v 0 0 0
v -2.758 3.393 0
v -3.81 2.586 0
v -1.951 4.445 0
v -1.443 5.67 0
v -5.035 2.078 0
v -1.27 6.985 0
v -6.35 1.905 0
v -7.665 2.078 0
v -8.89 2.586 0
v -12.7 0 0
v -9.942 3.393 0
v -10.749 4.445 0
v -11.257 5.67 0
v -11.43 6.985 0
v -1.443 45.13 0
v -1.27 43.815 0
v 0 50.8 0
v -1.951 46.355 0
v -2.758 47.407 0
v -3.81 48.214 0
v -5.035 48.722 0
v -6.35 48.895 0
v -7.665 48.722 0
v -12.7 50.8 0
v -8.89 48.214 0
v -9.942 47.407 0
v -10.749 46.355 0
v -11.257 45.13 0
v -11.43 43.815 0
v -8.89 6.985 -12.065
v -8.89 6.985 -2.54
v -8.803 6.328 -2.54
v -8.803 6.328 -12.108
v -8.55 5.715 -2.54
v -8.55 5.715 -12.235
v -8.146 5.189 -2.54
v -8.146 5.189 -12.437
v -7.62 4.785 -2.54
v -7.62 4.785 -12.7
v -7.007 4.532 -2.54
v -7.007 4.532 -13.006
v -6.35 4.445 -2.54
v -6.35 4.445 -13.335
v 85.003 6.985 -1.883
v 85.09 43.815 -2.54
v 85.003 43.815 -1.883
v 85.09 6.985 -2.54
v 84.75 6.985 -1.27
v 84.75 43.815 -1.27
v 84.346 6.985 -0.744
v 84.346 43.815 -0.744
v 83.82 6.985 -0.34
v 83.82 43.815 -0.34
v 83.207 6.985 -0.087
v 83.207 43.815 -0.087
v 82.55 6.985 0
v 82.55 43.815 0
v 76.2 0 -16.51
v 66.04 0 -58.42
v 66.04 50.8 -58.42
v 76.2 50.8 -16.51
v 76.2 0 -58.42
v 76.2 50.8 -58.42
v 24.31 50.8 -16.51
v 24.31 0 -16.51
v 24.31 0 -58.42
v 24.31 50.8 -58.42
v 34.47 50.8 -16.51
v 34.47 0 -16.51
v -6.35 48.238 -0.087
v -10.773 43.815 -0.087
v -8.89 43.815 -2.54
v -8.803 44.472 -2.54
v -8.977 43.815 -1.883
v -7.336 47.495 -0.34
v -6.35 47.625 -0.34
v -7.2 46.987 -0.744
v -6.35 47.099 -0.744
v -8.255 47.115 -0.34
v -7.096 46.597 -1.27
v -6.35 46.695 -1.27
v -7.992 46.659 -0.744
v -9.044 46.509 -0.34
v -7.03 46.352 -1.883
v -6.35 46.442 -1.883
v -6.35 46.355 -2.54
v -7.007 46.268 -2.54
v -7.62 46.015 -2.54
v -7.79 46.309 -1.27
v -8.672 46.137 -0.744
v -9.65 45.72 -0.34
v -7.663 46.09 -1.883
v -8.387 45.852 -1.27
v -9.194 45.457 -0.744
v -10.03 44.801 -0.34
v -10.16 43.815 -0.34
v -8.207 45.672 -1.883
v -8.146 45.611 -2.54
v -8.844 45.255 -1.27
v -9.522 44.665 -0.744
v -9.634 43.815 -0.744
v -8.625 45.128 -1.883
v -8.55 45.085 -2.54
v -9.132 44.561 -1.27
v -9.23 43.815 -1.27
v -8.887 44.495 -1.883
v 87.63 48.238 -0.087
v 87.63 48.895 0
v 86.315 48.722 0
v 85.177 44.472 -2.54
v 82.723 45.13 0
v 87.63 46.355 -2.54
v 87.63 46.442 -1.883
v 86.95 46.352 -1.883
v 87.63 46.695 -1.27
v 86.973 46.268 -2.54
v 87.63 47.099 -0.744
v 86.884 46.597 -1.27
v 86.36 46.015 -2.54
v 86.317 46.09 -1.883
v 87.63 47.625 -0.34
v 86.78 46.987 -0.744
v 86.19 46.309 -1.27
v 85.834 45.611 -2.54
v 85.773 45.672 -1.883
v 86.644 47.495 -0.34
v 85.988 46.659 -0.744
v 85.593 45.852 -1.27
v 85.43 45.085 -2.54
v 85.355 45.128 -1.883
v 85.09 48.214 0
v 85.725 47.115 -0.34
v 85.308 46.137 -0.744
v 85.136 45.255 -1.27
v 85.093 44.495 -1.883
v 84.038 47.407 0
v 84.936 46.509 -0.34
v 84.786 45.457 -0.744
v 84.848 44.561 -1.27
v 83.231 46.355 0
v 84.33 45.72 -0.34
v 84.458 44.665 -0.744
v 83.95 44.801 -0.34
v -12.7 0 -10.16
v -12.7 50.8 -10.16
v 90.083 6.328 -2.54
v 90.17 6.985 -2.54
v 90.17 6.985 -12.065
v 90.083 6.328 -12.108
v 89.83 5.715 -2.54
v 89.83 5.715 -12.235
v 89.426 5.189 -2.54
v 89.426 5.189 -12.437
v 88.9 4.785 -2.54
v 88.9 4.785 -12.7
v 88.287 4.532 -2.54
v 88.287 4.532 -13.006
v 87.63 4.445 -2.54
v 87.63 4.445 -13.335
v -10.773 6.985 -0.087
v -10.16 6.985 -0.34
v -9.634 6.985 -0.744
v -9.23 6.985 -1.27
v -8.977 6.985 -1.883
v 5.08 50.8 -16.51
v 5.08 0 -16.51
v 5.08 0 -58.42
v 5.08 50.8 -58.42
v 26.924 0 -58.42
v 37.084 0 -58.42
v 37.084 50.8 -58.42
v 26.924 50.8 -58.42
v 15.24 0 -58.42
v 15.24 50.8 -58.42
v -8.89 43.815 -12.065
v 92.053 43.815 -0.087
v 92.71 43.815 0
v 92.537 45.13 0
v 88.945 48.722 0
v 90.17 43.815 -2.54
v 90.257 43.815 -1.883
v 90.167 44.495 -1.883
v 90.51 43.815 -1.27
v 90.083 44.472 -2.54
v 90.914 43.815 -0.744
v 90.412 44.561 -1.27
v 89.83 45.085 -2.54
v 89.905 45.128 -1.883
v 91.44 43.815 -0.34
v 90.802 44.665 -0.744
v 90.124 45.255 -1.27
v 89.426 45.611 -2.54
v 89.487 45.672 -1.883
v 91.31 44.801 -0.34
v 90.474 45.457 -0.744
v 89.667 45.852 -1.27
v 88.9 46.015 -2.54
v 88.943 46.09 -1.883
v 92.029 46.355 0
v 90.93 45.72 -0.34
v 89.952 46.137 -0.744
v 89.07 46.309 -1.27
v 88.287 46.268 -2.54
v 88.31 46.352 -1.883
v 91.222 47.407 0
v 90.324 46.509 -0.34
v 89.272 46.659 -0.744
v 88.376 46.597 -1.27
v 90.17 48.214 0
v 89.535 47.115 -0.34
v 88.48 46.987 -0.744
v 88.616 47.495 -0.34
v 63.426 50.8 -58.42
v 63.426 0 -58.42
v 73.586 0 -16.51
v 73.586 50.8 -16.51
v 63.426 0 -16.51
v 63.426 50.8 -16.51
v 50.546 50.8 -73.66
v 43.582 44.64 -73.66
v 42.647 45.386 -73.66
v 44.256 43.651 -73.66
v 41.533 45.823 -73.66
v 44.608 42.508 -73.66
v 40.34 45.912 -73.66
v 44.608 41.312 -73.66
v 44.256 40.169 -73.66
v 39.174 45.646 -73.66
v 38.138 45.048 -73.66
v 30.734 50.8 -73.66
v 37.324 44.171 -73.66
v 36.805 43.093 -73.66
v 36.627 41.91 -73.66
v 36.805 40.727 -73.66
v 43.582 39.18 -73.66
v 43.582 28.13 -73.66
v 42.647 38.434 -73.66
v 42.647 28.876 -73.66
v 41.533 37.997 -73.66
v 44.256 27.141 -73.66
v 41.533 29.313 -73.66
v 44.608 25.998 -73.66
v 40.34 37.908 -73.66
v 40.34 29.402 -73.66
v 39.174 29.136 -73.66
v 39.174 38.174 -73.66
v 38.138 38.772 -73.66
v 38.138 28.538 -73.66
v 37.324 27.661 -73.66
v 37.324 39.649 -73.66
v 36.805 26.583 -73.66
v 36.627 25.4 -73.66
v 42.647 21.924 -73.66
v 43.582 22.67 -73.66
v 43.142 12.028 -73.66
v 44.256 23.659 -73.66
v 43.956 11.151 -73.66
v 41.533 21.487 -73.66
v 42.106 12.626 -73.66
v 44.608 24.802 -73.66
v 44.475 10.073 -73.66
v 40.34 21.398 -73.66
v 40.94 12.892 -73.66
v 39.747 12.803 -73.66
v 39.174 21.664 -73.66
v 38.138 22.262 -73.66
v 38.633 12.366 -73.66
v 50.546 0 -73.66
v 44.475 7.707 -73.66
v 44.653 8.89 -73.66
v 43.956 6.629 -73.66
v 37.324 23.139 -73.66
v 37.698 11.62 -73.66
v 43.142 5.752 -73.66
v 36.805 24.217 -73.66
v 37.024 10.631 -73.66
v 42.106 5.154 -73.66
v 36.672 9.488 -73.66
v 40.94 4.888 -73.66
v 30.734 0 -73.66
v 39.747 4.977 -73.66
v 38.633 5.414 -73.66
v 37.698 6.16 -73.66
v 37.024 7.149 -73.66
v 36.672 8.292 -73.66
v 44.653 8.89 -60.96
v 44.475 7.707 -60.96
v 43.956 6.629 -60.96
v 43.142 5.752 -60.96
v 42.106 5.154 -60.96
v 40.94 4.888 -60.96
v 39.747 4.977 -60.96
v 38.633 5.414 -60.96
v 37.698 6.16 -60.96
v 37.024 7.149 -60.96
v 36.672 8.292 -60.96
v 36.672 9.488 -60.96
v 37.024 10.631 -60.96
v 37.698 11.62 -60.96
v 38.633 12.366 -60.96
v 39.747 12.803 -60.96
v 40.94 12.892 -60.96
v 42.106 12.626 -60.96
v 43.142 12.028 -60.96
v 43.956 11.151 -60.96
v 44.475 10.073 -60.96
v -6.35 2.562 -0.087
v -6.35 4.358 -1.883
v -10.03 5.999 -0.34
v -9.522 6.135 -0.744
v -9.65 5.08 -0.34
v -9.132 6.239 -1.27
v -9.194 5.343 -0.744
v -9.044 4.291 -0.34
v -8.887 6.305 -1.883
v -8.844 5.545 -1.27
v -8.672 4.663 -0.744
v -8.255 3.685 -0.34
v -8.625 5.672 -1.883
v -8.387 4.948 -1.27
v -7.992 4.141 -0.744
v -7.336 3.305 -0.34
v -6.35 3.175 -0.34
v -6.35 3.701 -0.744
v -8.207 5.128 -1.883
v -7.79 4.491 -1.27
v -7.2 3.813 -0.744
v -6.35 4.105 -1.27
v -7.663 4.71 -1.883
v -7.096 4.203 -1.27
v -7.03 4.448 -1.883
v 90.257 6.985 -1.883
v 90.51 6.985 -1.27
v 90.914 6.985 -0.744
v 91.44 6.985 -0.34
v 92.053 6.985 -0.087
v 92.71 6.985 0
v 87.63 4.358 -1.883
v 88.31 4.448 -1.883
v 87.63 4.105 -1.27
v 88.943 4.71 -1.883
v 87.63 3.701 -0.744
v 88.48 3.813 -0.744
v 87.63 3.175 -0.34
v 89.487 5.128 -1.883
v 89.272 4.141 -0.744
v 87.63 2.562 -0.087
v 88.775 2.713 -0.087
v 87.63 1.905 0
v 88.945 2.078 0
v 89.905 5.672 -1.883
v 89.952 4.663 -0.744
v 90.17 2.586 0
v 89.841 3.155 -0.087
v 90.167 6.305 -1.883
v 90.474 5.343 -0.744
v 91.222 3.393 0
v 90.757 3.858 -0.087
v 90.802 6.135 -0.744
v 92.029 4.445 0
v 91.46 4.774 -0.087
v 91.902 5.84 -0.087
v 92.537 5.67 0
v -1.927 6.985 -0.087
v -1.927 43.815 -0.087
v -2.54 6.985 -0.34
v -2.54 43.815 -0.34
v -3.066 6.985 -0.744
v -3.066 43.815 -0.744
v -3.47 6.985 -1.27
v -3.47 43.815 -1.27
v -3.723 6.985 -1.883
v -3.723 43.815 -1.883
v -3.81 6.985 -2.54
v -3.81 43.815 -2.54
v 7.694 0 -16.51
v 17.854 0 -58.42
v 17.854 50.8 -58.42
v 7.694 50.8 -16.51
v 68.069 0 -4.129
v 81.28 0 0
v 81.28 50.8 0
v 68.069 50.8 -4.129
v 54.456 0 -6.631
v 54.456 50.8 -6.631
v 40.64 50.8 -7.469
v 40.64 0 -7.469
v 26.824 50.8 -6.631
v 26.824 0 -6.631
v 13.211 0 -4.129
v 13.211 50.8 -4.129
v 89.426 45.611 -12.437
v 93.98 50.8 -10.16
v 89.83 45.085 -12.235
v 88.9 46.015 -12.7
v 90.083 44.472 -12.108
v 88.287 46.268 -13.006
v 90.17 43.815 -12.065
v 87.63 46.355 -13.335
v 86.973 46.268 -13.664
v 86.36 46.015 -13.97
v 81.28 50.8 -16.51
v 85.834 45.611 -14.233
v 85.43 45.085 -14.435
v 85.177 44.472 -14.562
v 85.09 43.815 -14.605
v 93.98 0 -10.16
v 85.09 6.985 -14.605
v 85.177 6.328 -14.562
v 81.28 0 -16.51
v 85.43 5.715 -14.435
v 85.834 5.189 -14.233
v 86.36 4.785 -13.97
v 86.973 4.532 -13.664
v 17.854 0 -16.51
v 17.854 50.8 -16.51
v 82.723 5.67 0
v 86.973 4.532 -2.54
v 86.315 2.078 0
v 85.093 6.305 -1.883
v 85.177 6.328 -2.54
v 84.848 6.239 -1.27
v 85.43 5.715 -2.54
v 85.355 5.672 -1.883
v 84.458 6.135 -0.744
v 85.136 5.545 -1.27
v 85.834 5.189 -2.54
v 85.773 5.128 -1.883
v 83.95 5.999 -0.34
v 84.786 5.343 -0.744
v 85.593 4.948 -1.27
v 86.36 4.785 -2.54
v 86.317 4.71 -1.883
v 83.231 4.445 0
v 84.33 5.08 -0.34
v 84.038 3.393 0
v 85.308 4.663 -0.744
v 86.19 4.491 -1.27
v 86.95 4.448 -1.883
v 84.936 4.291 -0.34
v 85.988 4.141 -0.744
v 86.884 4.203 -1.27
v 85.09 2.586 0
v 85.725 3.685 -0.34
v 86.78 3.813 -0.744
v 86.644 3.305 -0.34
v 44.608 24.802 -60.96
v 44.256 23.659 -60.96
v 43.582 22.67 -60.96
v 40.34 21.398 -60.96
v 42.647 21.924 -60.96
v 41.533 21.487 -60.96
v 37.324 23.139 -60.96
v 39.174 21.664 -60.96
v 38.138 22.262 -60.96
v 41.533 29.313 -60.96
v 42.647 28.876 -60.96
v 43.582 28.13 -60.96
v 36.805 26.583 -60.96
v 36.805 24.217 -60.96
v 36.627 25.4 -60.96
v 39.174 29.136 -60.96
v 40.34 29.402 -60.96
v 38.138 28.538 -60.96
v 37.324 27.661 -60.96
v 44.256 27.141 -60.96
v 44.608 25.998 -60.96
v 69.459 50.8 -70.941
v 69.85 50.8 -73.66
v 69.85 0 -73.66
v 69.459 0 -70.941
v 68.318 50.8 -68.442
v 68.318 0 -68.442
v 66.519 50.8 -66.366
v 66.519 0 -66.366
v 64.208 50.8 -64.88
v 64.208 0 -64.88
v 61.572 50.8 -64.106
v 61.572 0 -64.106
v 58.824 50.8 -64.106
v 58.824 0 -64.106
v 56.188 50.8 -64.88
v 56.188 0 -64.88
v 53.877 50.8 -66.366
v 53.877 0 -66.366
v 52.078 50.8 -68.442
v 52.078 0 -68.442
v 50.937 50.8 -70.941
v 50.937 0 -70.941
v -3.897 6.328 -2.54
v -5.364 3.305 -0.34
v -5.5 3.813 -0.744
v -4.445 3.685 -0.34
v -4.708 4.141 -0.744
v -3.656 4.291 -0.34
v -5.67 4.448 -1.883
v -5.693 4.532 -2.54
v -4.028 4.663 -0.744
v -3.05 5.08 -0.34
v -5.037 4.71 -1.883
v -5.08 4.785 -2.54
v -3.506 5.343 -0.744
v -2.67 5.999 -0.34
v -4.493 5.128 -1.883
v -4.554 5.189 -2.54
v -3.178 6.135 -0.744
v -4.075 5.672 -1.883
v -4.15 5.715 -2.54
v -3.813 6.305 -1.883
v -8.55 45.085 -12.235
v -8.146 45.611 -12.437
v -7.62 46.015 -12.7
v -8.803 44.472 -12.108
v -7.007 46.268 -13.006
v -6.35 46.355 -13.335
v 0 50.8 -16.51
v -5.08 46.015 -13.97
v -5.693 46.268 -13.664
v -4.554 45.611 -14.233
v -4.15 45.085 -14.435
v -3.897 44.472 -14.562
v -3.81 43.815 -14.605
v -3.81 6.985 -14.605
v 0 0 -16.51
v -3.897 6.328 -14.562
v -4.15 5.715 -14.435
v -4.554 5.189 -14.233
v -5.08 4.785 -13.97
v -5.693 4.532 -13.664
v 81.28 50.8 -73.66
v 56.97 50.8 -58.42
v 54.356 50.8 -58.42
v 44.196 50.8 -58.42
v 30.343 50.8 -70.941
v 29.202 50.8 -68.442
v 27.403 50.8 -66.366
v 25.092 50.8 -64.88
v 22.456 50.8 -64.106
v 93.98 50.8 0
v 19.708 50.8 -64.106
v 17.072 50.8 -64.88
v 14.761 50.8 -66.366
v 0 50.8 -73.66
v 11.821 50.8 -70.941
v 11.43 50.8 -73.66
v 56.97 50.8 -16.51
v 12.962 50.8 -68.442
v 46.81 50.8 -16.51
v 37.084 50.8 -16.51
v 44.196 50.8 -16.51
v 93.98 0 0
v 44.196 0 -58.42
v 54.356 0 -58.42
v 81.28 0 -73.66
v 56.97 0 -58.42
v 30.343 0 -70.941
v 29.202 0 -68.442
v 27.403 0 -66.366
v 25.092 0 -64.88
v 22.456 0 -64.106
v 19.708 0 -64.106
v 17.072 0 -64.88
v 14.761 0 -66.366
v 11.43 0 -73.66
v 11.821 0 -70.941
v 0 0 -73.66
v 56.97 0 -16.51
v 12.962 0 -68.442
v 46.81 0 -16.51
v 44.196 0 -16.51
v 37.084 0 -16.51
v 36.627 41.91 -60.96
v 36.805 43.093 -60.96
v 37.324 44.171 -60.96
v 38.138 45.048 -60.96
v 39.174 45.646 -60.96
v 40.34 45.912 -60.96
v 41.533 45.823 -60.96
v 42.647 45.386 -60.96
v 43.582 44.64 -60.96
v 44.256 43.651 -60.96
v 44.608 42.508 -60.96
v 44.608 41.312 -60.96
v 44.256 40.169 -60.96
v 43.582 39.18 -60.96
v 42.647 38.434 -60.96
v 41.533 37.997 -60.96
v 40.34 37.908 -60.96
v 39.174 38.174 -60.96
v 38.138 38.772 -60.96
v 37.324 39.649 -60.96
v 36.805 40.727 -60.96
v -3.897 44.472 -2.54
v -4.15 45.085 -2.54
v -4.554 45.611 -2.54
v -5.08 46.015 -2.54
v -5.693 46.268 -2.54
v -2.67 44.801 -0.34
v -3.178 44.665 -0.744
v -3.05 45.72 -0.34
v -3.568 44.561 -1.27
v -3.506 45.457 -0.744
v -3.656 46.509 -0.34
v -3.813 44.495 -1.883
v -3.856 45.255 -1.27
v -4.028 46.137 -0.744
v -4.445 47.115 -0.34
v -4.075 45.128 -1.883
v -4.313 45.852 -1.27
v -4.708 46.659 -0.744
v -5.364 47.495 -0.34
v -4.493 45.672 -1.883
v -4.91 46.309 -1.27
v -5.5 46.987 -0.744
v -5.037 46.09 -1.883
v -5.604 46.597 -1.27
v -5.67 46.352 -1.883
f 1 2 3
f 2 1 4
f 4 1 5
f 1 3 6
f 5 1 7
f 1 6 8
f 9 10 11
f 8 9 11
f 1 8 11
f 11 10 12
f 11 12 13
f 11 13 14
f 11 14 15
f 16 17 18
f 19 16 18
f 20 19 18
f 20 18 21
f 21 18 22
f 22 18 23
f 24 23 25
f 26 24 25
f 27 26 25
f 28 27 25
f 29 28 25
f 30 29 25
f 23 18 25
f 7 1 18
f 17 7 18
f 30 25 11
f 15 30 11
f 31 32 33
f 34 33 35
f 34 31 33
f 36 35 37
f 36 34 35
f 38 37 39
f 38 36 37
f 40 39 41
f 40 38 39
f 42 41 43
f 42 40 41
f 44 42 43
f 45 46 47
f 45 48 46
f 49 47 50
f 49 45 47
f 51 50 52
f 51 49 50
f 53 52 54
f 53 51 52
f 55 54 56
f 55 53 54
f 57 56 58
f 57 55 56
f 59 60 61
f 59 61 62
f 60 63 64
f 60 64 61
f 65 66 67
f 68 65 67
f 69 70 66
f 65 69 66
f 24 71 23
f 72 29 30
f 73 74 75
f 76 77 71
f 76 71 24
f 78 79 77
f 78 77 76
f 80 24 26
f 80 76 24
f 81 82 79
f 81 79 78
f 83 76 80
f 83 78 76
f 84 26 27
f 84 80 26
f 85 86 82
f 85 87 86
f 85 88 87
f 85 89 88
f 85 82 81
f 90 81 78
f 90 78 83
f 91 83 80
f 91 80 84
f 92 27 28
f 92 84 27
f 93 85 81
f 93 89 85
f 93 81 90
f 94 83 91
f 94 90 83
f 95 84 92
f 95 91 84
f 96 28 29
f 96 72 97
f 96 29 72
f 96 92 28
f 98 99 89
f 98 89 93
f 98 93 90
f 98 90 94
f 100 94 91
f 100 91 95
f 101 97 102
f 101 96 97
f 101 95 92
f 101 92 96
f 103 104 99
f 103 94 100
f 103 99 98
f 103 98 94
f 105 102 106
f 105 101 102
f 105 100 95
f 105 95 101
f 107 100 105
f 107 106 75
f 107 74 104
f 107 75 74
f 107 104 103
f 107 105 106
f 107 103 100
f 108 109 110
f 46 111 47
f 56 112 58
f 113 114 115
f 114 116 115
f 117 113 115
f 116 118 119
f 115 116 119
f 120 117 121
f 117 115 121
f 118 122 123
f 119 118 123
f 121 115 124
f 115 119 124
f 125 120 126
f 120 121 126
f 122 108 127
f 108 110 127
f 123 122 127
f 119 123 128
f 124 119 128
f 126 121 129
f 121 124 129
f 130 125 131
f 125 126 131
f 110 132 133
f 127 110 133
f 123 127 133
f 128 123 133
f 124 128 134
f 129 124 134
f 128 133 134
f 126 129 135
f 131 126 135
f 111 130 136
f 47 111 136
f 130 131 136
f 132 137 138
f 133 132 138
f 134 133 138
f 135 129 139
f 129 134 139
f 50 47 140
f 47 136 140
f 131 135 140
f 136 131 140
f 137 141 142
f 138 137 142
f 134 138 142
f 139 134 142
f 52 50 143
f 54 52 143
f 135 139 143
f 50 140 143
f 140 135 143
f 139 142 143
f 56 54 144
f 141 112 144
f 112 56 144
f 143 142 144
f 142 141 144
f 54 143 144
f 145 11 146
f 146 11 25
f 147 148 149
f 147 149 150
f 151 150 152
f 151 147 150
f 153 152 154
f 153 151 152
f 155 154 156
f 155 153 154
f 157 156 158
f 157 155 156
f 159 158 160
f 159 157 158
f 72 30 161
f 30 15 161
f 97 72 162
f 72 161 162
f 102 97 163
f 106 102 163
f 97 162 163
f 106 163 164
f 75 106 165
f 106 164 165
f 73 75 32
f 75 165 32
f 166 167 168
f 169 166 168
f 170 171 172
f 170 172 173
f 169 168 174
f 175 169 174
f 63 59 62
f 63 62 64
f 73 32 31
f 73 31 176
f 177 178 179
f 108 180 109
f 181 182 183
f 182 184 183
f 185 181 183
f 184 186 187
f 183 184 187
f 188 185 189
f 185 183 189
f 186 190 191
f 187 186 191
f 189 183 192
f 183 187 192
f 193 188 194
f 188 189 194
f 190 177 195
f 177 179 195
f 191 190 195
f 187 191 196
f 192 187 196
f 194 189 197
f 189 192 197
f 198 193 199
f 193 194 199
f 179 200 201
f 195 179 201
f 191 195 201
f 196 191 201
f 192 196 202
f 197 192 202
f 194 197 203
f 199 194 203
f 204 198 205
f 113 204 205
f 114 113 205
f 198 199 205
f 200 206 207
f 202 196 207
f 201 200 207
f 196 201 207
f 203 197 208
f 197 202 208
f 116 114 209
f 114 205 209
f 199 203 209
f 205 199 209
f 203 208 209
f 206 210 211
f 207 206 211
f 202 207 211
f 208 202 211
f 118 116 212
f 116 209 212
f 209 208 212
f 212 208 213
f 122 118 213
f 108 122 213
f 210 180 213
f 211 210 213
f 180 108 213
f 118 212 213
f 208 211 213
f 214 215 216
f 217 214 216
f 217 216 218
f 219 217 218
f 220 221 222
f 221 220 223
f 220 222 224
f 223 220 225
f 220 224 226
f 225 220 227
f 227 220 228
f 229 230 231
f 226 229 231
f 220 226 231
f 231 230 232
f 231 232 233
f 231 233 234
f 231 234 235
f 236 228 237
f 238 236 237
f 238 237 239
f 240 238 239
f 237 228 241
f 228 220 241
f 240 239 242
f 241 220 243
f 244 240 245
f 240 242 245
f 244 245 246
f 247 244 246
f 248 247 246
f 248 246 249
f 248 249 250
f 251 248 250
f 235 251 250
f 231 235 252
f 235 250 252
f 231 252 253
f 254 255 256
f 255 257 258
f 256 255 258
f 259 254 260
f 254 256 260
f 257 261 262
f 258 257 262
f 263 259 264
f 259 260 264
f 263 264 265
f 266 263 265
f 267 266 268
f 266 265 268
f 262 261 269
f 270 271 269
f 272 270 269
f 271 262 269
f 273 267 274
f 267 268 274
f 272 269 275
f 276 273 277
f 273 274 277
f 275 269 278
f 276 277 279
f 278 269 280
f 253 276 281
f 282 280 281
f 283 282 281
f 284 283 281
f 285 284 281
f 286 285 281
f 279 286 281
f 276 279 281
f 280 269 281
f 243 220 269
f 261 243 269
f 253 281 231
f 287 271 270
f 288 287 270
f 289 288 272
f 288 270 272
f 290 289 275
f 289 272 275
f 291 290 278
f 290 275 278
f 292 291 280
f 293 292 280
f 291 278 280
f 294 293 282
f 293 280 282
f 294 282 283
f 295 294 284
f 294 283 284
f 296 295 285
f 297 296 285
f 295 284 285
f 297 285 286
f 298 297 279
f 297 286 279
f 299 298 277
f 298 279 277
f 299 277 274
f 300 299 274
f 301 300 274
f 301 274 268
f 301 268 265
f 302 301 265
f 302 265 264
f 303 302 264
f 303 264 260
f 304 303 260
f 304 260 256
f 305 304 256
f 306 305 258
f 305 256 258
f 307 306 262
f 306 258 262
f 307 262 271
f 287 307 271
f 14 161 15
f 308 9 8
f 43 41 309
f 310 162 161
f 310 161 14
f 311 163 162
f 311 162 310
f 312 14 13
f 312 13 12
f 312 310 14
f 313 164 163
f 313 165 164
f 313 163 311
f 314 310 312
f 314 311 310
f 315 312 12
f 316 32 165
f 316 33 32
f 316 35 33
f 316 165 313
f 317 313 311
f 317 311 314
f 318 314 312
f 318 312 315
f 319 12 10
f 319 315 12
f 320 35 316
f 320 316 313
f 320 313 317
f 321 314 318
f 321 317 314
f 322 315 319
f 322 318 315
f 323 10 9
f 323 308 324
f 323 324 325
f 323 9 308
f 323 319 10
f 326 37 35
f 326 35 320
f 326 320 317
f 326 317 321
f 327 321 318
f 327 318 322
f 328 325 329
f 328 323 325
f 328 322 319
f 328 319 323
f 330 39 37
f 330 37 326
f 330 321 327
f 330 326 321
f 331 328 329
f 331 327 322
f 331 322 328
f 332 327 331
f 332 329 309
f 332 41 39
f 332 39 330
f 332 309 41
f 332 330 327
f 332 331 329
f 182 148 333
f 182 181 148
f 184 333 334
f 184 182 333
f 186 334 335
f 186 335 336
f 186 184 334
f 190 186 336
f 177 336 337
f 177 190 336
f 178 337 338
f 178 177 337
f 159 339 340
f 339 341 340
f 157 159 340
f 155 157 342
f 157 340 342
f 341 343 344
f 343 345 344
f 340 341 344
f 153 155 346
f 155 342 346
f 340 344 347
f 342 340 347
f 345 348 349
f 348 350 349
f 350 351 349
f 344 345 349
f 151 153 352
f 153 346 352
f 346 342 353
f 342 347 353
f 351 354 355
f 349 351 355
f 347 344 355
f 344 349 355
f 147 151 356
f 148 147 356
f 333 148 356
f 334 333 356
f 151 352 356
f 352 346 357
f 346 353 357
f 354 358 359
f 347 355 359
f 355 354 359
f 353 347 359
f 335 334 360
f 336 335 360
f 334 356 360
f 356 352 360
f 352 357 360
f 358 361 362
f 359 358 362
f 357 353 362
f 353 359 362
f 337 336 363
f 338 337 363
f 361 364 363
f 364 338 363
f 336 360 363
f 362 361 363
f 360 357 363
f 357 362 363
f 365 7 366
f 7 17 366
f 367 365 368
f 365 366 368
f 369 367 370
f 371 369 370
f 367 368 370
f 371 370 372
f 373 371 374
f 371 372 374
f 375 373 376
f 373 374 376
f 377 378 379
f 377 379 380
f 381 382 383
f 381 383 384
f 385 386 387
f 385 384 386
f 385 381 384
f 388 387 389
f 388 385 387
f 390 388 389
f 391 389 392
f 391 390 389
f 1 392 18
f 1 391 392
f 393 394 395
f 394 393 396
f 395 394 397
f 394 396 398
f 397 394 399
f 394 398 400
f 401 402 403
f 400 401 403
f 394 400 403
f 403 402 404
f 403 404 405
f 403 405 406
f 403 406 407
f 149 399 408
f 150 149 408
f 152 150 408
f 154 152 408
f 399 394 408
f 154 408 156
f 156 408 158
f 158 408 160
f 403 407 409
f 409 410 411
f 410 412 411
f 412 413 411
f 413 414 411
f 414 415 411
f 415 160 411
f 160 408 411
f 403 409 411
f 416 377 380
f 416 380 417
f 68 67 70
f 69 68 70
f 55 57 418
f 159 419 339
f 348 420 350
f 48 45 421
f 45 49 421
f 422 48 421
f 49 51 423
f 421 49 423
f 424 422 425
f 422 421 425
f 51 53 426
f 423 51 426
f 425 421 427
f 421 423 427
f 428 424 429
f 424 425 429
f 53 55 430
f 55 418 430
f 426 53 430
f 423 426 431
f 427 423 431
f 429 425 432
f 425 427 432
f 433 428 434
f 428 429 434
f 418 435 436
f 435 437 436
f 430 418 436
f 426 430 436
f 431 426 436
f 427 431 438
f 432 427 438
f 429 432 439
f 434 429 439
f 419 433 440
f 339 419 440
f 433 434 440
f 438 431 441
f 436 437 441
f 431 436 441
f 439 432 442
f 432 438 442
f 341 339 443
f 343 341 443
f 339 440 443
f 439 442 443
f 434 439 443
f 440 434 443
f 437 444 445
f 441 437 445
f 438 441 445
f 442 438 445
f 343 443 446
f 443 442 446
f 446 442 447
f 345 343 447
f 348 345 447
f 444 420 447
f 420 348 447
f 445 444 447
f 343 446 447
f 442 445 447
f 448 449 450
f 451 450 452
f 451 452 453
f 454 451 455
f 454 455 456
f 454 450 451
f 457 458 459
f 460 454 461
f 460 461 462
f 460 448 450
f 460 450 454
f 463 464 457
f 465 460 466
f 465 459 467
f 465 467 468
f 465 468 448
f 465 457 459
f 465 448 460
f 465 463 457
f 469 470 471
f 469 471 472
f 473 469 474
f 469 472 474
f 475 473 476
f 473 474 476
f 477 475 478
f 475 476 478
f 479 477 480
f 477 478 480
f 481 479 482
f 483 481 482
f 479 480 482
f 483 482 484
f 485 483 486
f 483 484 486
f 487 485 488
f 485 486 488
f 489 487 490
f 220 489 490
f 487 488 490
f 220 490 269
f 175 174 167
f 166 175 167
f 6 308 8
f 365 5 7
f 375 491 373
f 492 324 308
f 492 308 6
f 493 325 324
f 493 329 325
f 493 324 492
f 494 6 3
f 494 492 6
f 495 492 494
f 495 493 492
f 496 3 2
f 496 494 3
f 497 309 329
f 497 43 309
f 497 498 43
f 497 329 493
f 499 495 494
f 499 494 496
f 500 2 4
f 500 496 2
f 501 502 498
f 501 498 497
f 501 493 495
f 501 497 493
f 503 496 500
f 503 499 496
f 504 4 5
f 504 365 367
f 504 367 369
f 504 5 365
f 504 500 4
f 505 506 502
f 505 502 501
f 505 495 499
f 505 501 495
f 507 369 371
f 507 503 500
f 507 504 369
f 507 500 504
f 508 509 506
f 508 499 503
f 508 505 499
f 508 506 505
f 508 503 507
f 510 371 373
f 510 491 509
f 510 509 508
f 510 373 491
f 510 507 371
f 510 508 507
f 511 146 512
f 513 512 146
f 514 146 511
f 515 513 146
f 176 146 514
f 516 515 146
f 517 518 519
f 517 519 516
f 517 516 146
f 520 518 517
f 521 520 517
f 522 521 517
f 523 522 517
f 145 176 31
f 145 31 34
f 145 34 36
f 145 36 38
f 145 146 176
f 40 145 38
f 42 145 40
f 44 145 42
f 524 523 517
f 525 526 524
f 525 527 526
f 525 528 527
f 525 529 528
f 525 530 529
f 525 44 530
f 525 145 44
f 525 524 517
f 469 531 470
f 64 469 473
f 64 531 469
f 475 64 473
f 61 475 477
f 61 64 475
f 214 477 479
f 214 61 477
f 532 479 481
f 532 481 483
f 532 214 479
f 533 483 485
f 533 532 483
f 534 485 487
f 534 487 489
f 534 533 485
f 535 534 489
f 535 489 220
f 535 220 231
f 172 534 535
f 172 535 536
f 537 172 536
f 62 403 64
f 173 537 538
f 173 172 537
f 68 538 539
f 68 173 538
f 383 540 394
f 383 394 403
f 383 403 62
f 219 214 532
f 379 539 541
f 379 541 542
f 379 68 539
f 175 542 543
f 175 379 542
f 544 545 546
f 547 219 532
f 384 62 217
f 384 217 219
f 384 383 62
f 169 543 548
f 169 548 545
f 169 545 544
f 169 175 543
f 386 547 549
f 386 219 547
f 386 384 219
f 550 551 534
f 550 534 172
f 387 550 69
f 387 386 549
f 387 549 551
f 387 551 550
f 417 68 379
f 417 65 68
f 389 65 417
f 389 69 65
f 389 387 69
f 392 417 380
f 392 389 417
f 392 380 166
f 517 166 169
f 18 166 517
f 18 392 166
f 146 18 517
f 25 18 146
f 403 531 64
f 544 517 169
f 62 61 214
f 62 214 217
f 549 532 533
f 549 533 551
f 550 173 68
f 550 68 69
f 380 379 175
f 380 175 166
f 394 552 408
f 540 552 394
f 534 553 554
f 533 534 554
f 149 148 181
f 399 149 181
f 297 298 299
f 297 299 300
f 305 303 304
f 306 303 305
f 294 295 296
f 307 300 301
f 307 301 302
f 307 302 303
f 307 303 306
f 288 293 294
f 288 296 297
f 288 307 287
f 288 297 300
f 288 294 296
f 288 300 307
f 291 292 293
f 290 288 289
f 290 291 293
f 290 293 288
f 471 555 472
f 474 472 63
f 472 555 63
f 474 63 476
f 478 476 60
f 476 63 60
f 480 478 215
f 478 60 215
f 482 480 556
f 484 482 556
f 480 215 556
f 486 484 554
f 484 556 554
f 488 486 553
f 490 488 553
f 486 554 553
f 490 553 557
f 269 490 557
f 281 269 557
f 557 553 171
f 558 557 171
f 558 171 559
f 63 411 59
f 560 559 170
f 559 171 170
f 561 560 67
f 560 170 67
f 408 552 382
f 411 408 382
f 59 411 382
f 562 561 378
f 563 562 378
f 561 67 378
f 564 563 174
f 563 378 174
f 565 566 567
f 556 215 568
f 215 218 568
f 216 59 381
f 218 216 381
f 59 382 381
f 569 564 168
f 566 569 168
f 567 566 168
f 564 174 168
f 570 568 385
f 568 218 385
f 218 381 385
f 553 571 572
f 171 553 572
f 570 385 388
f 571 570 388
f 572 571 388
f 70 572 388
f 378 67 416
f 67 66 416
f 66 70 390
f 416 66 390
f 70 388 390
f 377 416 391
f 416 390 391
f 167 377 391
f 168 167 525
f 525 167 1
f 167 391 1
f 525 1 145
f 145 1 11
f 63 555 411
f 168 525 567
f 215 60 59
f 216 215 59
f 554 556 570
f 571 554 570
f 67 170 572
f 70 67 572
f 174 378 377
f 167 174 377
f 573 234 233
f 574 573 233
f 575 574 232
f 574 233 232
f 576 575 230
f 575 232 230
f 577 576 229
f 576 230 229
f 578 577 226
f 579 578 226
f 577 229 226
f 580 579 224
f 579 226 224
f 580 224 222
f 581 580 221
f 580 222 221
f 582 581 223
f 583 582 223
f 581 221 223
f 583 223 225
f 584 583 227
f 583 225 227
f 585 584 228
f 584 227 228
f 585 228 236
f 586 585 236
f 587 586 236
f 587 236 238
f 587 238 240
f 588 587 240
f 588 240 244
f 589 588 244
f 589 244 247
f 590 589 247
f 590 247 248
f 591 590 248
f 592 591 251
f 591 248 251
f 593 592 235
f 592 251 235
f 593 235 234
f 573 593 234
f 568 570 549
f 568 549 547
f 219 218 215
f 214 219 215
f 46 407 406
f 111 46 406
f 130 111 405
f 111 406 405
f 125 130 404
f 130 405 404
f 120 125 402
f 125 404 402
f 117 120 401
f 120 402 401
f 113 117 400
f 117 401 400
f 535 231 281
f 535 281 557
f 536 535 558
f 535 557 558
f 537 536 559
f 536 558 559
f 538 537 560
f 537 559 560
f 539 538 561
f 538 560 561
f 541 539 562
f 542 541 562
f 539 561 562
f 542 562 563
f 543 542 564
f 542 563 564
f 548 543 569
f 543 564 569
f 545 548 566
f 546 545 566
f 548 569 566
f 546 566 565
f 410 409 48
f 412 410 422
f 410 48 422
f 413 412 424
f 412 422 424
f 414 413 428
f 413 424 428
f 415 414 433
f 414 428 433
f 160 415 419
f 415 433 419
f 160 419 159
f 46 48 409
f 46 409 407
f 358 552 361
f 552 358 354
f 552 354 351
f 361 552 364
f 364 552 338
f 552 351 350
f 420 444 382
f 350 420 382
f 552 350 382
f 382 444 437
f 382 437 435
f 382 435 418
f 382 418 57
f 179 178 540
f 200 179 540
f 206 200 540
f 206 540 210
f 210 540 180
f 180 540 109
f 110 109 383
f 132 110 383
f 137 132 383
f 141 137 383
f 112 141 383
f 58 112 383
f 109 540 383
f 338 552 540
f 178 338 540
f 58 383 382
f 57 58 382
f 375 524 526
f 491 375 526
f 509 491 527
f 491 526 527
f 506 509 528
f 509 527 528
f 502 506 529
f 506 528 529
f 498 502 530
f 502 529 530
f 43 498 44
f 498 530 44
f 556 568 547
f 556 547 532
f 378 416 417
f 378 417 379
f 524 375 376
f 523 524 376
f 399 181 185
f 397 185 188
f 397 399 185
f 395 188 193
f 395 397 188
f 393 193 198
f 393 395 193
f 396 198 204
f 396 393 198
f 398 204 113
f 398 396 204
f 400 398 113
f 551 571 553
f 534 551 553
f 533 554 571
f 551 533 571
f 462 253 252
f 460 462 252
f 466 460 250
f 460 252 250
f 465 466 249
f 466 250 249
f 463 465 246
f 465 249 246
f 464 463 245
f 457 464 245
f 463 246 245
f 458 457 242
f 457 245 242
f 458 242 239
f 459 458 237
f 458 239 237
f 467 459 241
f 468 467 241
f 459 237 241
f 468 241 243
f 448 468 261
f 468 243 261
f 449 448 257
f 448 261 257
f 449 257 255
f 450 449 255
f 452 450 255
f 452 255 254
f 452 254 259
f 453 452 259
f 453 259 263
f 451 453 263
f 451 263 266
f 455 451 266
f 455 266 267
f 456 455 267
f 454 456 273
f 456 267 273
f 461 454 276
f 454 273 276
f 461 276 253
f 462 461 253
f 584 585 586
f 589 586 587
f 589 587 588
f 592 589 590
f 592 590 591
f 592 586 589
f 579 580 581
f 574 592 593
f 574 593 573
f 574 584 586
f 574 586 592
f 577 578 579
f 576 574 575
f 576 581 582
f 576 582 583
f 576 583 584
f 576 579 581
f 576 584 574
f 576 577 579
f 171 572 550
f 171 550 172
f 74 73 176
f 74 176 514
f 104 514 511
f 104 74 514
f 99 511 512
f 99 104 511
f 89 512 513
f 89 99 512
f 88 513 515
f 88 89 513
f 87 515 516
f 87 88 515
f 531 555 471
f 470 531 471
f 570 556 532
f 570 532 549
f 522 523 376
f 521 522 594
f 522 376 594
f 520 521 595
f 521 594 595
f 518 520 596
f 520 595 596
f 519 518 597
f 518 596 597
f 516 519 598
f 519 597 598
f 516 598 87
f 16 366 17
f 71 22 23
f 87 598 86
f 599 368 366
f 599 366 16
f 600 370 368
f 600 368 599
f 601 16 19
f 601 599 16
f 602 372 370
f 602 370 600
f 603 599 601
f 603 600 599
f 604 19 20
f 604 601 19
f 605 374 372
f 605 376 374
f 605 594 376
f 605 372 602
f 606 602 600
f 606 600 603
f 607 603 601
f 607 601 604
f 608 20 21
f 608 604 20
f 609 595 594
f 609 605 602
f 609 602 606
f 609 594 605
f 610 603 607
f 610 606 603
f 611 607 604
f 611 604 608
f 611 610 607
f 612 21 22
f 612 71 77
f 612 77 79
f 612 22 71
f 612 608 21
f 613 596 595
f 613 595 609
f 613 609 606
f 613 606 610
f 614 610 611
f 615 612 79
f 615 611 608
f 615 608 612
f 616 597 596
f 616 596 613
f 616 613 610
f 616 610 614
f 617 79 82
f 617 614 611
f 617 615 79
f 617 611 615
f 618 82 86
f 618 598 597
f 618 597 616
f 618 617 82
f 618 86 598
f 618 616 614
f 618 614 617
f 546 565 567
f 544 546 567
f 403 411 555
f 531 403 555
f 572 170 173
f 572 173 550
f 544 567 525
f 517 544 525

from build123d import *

# Parameters (mm, degrees)
BOSS_EXTRUDE1_DEPTH     = 50.8
SKETCH2_W               = 12.7
SKETCH2_H               = 50.8
SKETCH2_W_2             = 5.08
SKETCH2_H_2             = 41.91
BOSS_EXTRUDE2_DEPTH     = 5.08
CUT_EXTRUDE1_DEPTH      = 130.763924108
CUT_EXTRUDE1_DEPTH_BACK = 130.763924108
SKETCH5_R               = 4.0132
CUT_EXTRUDE2_DEPTH      = 12.7
BOSS_EXTRUDE3_DEPTH     = 50.8
CUT_EXTRUDE4_DEPTH      = 130.763924108
SKETCH10_W              = 5.08
SKETCH10_H              = 41.91
CUT_EXTRUDE5_DEPTH      = 127.949189836
FILLET1_R               = 2.54
FILLET2_R               = 2.54
FILLET3_R               = 2.54


with BuildPart() as part:
    # Sketch1 → Boss-Extrude1 (new body)
    with BuildSketch(Plane(origin=(0, 0, 0), x_dir=(1, 0, 0), z_dir=(0, 1, 0))):
        with BuildLine():
            Line((0, 0), (40.64, 0))
            Line((40.64, 0), (40.64, 73.66))
            Line((40.64, 73.66), (30.734, 73.66))
            ThreePointArc((30.734, 73.66), (21.082, 64.008), (11.43, 73.66))
            Line((11.43, 73.66), (0, 73.66))
            Line((0, 73.66), (0, 0))
        make_face()
        with BuildLine():
            Line((40.64, 73.66), (40.64, 0))
            Line((40.64, 0), (81.28, 0))
            Line((81.28, 0), (81.28, 73.66))
            Line((81.28, 73.66), (69.85, 73.66))
            ThreePointArc((69.85, 73.66), (60.198, 64.008), (50.546, 73.66))
            Line((50.546, 73.66), (40.64, 73.66))
        make_face()
    extrude(amount=BOSS_EXTRUDE1_DEPTH)

    # Sketch2 → Boss-Extrude2 (add)
    with BuildSketch(Plane.XY):
        with Locations((-6.35, 25.4)):
            Rectangle(SKETCH2_W, SKETCH2_H)
        with Locations((-6.35, 25.4)):
            Rectangle(SKETCH2_W_2, SKETCH2_H_2, mode=Mode.SUBTRACT)
    boss_extrude2 = extrude(amount=-BOSS_EXTRUDE2_DEPTH)

    # Mirror3: Boss-Extrude2 across plane
    add(boss_extrude2.mirror(Plane.ZY.offset(-40.64)))

    # Sketch4 → Cut-Extrude1 (cut, two sides: drawn at the far end of the back side and taken through both)
    with BuildSketch(Plane(origin=(0, 50.8, 0), x_dir=(1, 0, 0), z_dir=(0, 1, 0)).offset(-CUT_EXTRUDE1_DEPTH_BACK)):
        with BuildLine():
            Line((313.835320216, -88.467212956), (81.28, 0))
            ThreePointArc((81.28, 0), (40.64, 7.468916508), (0, 0))
            Line((0, 0), (-232.555320216, -88.467212956))
            Line((-232.555320216, -88.467212956), (-232.555320216, -586.095285833))
            Line((-232.555320216, -586.095285833), (313.835320216, -586.095285833))
            Line((313.835320216, -586.095285833), (313.835320216, -88.467212956))
        make_face()
    extrude(amount=CUT_EXTRUDE1_DEPTH + CUT_EXTRUDE1_DEPTH_BACK, mode=Mode.SUBTRACT)

    # Sketch5 → Cut-Extrude2 (cut)
    with BuildSketch(Plane(origin=(0, 0, -73.66), x_dir=(-1, 0, 0), z_dir=(0, 0, -1))):
        with Locations((-40.64, 41.91)):
            Circle(SKETCH5_R)
        with Locations(Location((-40.64, 8.89, 0), (0, 0, 180))):
            Circle(SKETCH5_R)
        with Locations((-40.64, 25.4)):
            Circle(SKETCH5_R)
    extrude(amount=-CUT_EXTRUDE2_DEPTH, mode=Mode.SUBTRACT)

    # Sketch9 → Boss-Extrude3 (add)
    with BuildSketch(Plane(origin=(0, 0, 0), x_dir=(-1, 0, 0), z_dir=(0, -1, 0))):
        Polygon((0, 5.08), (12.7, 5.08), (12.7, 10.16), (0, 16.51), (0, 8.89), align=None)
    boss_extrude3 = extrude(amount=-BOSS_EXTRUDE3_DEPTH)

    # Sketch7 → Cut-Extrude4 (cut, through all)
    with BuildSketch(Plane.XZ):
        Polygon((5.08, -16.51), (5.08, -58.42), (15.24, -58.42), align=None)
        Polygon((7.693571769, -16.51), (17.853571769, -16.51), (17.853571769, -58.42), align=None)
        Polygon((73.586428231, -16.51), (63.426428231, -16.51), (63.426428231, -58.42), align=None)
        Polygon((66.04, -58.42), (76.2, -16.51), (76.2, -58.42), align=None)
        Polygon((24.310428231, -58.42), (34.470428231, -16.51), (24.310428231, -16.51), align=None)
        Polygon((26.924, -58.42), (37.084, -16.51), (37.084, -58.42), align=None)
        Polygon((44.196, -16.51), (44.196, -58.42), (54.356, -58.42), align=None)
        Polygon((56.969571769, -58.42), (46.809571769, -16.51), (56.969571769, -16.51), align=None)
    extrude(amount=-CUT_EXTRUDE4_DEPTH, mode=Mode.SUBTRACT)

    # Sketch10 → Cut-Extrude5 (cut, through all)
    with BuildSketch(Plane.XY.offset(-5.08)):
        with Locations((-6.35, 25.4)):
            Rectangle(SKETCH10_W, SKETCH10_H)
    cut_extrude5 = extrude(amount=-CUT_EXTRUDE5_DEPTH, mode=Mode.SUBTRACT)

    # Fillet1
    fillet1_edges = [part.edges().sort_by_distance(p)[0] for p in [
        (-3.81, 46.355, -7.3025),
        (-8.89, 46.355, -6.0325),
        (-8.89, 4.445, -6.0325),
        (-3.81, 4.445, -7.3025),
    ]]
    fillet(fillet1_edges, radius=FILLET1_R - 0.0001)  # a hair under: the kernel refuses the full size

    # Mirror4: Boss-Extrude3, Cut-Extrude5 across plane
    add(boss_extrude3.mirror(Plane.ZY.offset(-40.64)))
    add(cut_extrude5.mirror(Plane.ZY.offset(-40.64)), mode=Mode.SUBTRACT)

    # Fillet2
    fillet2_edges = [part.edges().sort_by_distance(p)[0] for p in [
        (90.17, 46.355, -6.0325),
        (85.09, 46.355, -7.3025),
        (85.09, 4.445, -7.3025),
        (90.17, 4.445, -6.0325),
    ]]
    fillet(fillet2_edges, radius=FILLET2_R - 0.0001)  # a hair under: the kernel refuses the full size

    # Fillet3
    fillet3_edges = [part.edges().sort_by_distance(p)[0] for p in [
        (-3.81, 25.4, 0),
        (-8.89, 25.4, 0),
        (-4.553919486, 45.611080514, 0),
        (-8.146080514, 45.611080514, 0),
        (-8.146080514, 5.188919486, 0),
        (-4.553919486, 5.188919486, 0),
        (90.17, 25.4, 0),
        (85.09, 25.4, 0),
        (89.426080514, 45.611080514, 0),
        (85.833919486, 45.611080514, 0),
        (85.833919486, 5.188919486, 0),
        (89.426080514, 5.188919486, 0),
    ]]
    fillet(fillet3_edges, radius=FILLET3_R)


solid = part.part
